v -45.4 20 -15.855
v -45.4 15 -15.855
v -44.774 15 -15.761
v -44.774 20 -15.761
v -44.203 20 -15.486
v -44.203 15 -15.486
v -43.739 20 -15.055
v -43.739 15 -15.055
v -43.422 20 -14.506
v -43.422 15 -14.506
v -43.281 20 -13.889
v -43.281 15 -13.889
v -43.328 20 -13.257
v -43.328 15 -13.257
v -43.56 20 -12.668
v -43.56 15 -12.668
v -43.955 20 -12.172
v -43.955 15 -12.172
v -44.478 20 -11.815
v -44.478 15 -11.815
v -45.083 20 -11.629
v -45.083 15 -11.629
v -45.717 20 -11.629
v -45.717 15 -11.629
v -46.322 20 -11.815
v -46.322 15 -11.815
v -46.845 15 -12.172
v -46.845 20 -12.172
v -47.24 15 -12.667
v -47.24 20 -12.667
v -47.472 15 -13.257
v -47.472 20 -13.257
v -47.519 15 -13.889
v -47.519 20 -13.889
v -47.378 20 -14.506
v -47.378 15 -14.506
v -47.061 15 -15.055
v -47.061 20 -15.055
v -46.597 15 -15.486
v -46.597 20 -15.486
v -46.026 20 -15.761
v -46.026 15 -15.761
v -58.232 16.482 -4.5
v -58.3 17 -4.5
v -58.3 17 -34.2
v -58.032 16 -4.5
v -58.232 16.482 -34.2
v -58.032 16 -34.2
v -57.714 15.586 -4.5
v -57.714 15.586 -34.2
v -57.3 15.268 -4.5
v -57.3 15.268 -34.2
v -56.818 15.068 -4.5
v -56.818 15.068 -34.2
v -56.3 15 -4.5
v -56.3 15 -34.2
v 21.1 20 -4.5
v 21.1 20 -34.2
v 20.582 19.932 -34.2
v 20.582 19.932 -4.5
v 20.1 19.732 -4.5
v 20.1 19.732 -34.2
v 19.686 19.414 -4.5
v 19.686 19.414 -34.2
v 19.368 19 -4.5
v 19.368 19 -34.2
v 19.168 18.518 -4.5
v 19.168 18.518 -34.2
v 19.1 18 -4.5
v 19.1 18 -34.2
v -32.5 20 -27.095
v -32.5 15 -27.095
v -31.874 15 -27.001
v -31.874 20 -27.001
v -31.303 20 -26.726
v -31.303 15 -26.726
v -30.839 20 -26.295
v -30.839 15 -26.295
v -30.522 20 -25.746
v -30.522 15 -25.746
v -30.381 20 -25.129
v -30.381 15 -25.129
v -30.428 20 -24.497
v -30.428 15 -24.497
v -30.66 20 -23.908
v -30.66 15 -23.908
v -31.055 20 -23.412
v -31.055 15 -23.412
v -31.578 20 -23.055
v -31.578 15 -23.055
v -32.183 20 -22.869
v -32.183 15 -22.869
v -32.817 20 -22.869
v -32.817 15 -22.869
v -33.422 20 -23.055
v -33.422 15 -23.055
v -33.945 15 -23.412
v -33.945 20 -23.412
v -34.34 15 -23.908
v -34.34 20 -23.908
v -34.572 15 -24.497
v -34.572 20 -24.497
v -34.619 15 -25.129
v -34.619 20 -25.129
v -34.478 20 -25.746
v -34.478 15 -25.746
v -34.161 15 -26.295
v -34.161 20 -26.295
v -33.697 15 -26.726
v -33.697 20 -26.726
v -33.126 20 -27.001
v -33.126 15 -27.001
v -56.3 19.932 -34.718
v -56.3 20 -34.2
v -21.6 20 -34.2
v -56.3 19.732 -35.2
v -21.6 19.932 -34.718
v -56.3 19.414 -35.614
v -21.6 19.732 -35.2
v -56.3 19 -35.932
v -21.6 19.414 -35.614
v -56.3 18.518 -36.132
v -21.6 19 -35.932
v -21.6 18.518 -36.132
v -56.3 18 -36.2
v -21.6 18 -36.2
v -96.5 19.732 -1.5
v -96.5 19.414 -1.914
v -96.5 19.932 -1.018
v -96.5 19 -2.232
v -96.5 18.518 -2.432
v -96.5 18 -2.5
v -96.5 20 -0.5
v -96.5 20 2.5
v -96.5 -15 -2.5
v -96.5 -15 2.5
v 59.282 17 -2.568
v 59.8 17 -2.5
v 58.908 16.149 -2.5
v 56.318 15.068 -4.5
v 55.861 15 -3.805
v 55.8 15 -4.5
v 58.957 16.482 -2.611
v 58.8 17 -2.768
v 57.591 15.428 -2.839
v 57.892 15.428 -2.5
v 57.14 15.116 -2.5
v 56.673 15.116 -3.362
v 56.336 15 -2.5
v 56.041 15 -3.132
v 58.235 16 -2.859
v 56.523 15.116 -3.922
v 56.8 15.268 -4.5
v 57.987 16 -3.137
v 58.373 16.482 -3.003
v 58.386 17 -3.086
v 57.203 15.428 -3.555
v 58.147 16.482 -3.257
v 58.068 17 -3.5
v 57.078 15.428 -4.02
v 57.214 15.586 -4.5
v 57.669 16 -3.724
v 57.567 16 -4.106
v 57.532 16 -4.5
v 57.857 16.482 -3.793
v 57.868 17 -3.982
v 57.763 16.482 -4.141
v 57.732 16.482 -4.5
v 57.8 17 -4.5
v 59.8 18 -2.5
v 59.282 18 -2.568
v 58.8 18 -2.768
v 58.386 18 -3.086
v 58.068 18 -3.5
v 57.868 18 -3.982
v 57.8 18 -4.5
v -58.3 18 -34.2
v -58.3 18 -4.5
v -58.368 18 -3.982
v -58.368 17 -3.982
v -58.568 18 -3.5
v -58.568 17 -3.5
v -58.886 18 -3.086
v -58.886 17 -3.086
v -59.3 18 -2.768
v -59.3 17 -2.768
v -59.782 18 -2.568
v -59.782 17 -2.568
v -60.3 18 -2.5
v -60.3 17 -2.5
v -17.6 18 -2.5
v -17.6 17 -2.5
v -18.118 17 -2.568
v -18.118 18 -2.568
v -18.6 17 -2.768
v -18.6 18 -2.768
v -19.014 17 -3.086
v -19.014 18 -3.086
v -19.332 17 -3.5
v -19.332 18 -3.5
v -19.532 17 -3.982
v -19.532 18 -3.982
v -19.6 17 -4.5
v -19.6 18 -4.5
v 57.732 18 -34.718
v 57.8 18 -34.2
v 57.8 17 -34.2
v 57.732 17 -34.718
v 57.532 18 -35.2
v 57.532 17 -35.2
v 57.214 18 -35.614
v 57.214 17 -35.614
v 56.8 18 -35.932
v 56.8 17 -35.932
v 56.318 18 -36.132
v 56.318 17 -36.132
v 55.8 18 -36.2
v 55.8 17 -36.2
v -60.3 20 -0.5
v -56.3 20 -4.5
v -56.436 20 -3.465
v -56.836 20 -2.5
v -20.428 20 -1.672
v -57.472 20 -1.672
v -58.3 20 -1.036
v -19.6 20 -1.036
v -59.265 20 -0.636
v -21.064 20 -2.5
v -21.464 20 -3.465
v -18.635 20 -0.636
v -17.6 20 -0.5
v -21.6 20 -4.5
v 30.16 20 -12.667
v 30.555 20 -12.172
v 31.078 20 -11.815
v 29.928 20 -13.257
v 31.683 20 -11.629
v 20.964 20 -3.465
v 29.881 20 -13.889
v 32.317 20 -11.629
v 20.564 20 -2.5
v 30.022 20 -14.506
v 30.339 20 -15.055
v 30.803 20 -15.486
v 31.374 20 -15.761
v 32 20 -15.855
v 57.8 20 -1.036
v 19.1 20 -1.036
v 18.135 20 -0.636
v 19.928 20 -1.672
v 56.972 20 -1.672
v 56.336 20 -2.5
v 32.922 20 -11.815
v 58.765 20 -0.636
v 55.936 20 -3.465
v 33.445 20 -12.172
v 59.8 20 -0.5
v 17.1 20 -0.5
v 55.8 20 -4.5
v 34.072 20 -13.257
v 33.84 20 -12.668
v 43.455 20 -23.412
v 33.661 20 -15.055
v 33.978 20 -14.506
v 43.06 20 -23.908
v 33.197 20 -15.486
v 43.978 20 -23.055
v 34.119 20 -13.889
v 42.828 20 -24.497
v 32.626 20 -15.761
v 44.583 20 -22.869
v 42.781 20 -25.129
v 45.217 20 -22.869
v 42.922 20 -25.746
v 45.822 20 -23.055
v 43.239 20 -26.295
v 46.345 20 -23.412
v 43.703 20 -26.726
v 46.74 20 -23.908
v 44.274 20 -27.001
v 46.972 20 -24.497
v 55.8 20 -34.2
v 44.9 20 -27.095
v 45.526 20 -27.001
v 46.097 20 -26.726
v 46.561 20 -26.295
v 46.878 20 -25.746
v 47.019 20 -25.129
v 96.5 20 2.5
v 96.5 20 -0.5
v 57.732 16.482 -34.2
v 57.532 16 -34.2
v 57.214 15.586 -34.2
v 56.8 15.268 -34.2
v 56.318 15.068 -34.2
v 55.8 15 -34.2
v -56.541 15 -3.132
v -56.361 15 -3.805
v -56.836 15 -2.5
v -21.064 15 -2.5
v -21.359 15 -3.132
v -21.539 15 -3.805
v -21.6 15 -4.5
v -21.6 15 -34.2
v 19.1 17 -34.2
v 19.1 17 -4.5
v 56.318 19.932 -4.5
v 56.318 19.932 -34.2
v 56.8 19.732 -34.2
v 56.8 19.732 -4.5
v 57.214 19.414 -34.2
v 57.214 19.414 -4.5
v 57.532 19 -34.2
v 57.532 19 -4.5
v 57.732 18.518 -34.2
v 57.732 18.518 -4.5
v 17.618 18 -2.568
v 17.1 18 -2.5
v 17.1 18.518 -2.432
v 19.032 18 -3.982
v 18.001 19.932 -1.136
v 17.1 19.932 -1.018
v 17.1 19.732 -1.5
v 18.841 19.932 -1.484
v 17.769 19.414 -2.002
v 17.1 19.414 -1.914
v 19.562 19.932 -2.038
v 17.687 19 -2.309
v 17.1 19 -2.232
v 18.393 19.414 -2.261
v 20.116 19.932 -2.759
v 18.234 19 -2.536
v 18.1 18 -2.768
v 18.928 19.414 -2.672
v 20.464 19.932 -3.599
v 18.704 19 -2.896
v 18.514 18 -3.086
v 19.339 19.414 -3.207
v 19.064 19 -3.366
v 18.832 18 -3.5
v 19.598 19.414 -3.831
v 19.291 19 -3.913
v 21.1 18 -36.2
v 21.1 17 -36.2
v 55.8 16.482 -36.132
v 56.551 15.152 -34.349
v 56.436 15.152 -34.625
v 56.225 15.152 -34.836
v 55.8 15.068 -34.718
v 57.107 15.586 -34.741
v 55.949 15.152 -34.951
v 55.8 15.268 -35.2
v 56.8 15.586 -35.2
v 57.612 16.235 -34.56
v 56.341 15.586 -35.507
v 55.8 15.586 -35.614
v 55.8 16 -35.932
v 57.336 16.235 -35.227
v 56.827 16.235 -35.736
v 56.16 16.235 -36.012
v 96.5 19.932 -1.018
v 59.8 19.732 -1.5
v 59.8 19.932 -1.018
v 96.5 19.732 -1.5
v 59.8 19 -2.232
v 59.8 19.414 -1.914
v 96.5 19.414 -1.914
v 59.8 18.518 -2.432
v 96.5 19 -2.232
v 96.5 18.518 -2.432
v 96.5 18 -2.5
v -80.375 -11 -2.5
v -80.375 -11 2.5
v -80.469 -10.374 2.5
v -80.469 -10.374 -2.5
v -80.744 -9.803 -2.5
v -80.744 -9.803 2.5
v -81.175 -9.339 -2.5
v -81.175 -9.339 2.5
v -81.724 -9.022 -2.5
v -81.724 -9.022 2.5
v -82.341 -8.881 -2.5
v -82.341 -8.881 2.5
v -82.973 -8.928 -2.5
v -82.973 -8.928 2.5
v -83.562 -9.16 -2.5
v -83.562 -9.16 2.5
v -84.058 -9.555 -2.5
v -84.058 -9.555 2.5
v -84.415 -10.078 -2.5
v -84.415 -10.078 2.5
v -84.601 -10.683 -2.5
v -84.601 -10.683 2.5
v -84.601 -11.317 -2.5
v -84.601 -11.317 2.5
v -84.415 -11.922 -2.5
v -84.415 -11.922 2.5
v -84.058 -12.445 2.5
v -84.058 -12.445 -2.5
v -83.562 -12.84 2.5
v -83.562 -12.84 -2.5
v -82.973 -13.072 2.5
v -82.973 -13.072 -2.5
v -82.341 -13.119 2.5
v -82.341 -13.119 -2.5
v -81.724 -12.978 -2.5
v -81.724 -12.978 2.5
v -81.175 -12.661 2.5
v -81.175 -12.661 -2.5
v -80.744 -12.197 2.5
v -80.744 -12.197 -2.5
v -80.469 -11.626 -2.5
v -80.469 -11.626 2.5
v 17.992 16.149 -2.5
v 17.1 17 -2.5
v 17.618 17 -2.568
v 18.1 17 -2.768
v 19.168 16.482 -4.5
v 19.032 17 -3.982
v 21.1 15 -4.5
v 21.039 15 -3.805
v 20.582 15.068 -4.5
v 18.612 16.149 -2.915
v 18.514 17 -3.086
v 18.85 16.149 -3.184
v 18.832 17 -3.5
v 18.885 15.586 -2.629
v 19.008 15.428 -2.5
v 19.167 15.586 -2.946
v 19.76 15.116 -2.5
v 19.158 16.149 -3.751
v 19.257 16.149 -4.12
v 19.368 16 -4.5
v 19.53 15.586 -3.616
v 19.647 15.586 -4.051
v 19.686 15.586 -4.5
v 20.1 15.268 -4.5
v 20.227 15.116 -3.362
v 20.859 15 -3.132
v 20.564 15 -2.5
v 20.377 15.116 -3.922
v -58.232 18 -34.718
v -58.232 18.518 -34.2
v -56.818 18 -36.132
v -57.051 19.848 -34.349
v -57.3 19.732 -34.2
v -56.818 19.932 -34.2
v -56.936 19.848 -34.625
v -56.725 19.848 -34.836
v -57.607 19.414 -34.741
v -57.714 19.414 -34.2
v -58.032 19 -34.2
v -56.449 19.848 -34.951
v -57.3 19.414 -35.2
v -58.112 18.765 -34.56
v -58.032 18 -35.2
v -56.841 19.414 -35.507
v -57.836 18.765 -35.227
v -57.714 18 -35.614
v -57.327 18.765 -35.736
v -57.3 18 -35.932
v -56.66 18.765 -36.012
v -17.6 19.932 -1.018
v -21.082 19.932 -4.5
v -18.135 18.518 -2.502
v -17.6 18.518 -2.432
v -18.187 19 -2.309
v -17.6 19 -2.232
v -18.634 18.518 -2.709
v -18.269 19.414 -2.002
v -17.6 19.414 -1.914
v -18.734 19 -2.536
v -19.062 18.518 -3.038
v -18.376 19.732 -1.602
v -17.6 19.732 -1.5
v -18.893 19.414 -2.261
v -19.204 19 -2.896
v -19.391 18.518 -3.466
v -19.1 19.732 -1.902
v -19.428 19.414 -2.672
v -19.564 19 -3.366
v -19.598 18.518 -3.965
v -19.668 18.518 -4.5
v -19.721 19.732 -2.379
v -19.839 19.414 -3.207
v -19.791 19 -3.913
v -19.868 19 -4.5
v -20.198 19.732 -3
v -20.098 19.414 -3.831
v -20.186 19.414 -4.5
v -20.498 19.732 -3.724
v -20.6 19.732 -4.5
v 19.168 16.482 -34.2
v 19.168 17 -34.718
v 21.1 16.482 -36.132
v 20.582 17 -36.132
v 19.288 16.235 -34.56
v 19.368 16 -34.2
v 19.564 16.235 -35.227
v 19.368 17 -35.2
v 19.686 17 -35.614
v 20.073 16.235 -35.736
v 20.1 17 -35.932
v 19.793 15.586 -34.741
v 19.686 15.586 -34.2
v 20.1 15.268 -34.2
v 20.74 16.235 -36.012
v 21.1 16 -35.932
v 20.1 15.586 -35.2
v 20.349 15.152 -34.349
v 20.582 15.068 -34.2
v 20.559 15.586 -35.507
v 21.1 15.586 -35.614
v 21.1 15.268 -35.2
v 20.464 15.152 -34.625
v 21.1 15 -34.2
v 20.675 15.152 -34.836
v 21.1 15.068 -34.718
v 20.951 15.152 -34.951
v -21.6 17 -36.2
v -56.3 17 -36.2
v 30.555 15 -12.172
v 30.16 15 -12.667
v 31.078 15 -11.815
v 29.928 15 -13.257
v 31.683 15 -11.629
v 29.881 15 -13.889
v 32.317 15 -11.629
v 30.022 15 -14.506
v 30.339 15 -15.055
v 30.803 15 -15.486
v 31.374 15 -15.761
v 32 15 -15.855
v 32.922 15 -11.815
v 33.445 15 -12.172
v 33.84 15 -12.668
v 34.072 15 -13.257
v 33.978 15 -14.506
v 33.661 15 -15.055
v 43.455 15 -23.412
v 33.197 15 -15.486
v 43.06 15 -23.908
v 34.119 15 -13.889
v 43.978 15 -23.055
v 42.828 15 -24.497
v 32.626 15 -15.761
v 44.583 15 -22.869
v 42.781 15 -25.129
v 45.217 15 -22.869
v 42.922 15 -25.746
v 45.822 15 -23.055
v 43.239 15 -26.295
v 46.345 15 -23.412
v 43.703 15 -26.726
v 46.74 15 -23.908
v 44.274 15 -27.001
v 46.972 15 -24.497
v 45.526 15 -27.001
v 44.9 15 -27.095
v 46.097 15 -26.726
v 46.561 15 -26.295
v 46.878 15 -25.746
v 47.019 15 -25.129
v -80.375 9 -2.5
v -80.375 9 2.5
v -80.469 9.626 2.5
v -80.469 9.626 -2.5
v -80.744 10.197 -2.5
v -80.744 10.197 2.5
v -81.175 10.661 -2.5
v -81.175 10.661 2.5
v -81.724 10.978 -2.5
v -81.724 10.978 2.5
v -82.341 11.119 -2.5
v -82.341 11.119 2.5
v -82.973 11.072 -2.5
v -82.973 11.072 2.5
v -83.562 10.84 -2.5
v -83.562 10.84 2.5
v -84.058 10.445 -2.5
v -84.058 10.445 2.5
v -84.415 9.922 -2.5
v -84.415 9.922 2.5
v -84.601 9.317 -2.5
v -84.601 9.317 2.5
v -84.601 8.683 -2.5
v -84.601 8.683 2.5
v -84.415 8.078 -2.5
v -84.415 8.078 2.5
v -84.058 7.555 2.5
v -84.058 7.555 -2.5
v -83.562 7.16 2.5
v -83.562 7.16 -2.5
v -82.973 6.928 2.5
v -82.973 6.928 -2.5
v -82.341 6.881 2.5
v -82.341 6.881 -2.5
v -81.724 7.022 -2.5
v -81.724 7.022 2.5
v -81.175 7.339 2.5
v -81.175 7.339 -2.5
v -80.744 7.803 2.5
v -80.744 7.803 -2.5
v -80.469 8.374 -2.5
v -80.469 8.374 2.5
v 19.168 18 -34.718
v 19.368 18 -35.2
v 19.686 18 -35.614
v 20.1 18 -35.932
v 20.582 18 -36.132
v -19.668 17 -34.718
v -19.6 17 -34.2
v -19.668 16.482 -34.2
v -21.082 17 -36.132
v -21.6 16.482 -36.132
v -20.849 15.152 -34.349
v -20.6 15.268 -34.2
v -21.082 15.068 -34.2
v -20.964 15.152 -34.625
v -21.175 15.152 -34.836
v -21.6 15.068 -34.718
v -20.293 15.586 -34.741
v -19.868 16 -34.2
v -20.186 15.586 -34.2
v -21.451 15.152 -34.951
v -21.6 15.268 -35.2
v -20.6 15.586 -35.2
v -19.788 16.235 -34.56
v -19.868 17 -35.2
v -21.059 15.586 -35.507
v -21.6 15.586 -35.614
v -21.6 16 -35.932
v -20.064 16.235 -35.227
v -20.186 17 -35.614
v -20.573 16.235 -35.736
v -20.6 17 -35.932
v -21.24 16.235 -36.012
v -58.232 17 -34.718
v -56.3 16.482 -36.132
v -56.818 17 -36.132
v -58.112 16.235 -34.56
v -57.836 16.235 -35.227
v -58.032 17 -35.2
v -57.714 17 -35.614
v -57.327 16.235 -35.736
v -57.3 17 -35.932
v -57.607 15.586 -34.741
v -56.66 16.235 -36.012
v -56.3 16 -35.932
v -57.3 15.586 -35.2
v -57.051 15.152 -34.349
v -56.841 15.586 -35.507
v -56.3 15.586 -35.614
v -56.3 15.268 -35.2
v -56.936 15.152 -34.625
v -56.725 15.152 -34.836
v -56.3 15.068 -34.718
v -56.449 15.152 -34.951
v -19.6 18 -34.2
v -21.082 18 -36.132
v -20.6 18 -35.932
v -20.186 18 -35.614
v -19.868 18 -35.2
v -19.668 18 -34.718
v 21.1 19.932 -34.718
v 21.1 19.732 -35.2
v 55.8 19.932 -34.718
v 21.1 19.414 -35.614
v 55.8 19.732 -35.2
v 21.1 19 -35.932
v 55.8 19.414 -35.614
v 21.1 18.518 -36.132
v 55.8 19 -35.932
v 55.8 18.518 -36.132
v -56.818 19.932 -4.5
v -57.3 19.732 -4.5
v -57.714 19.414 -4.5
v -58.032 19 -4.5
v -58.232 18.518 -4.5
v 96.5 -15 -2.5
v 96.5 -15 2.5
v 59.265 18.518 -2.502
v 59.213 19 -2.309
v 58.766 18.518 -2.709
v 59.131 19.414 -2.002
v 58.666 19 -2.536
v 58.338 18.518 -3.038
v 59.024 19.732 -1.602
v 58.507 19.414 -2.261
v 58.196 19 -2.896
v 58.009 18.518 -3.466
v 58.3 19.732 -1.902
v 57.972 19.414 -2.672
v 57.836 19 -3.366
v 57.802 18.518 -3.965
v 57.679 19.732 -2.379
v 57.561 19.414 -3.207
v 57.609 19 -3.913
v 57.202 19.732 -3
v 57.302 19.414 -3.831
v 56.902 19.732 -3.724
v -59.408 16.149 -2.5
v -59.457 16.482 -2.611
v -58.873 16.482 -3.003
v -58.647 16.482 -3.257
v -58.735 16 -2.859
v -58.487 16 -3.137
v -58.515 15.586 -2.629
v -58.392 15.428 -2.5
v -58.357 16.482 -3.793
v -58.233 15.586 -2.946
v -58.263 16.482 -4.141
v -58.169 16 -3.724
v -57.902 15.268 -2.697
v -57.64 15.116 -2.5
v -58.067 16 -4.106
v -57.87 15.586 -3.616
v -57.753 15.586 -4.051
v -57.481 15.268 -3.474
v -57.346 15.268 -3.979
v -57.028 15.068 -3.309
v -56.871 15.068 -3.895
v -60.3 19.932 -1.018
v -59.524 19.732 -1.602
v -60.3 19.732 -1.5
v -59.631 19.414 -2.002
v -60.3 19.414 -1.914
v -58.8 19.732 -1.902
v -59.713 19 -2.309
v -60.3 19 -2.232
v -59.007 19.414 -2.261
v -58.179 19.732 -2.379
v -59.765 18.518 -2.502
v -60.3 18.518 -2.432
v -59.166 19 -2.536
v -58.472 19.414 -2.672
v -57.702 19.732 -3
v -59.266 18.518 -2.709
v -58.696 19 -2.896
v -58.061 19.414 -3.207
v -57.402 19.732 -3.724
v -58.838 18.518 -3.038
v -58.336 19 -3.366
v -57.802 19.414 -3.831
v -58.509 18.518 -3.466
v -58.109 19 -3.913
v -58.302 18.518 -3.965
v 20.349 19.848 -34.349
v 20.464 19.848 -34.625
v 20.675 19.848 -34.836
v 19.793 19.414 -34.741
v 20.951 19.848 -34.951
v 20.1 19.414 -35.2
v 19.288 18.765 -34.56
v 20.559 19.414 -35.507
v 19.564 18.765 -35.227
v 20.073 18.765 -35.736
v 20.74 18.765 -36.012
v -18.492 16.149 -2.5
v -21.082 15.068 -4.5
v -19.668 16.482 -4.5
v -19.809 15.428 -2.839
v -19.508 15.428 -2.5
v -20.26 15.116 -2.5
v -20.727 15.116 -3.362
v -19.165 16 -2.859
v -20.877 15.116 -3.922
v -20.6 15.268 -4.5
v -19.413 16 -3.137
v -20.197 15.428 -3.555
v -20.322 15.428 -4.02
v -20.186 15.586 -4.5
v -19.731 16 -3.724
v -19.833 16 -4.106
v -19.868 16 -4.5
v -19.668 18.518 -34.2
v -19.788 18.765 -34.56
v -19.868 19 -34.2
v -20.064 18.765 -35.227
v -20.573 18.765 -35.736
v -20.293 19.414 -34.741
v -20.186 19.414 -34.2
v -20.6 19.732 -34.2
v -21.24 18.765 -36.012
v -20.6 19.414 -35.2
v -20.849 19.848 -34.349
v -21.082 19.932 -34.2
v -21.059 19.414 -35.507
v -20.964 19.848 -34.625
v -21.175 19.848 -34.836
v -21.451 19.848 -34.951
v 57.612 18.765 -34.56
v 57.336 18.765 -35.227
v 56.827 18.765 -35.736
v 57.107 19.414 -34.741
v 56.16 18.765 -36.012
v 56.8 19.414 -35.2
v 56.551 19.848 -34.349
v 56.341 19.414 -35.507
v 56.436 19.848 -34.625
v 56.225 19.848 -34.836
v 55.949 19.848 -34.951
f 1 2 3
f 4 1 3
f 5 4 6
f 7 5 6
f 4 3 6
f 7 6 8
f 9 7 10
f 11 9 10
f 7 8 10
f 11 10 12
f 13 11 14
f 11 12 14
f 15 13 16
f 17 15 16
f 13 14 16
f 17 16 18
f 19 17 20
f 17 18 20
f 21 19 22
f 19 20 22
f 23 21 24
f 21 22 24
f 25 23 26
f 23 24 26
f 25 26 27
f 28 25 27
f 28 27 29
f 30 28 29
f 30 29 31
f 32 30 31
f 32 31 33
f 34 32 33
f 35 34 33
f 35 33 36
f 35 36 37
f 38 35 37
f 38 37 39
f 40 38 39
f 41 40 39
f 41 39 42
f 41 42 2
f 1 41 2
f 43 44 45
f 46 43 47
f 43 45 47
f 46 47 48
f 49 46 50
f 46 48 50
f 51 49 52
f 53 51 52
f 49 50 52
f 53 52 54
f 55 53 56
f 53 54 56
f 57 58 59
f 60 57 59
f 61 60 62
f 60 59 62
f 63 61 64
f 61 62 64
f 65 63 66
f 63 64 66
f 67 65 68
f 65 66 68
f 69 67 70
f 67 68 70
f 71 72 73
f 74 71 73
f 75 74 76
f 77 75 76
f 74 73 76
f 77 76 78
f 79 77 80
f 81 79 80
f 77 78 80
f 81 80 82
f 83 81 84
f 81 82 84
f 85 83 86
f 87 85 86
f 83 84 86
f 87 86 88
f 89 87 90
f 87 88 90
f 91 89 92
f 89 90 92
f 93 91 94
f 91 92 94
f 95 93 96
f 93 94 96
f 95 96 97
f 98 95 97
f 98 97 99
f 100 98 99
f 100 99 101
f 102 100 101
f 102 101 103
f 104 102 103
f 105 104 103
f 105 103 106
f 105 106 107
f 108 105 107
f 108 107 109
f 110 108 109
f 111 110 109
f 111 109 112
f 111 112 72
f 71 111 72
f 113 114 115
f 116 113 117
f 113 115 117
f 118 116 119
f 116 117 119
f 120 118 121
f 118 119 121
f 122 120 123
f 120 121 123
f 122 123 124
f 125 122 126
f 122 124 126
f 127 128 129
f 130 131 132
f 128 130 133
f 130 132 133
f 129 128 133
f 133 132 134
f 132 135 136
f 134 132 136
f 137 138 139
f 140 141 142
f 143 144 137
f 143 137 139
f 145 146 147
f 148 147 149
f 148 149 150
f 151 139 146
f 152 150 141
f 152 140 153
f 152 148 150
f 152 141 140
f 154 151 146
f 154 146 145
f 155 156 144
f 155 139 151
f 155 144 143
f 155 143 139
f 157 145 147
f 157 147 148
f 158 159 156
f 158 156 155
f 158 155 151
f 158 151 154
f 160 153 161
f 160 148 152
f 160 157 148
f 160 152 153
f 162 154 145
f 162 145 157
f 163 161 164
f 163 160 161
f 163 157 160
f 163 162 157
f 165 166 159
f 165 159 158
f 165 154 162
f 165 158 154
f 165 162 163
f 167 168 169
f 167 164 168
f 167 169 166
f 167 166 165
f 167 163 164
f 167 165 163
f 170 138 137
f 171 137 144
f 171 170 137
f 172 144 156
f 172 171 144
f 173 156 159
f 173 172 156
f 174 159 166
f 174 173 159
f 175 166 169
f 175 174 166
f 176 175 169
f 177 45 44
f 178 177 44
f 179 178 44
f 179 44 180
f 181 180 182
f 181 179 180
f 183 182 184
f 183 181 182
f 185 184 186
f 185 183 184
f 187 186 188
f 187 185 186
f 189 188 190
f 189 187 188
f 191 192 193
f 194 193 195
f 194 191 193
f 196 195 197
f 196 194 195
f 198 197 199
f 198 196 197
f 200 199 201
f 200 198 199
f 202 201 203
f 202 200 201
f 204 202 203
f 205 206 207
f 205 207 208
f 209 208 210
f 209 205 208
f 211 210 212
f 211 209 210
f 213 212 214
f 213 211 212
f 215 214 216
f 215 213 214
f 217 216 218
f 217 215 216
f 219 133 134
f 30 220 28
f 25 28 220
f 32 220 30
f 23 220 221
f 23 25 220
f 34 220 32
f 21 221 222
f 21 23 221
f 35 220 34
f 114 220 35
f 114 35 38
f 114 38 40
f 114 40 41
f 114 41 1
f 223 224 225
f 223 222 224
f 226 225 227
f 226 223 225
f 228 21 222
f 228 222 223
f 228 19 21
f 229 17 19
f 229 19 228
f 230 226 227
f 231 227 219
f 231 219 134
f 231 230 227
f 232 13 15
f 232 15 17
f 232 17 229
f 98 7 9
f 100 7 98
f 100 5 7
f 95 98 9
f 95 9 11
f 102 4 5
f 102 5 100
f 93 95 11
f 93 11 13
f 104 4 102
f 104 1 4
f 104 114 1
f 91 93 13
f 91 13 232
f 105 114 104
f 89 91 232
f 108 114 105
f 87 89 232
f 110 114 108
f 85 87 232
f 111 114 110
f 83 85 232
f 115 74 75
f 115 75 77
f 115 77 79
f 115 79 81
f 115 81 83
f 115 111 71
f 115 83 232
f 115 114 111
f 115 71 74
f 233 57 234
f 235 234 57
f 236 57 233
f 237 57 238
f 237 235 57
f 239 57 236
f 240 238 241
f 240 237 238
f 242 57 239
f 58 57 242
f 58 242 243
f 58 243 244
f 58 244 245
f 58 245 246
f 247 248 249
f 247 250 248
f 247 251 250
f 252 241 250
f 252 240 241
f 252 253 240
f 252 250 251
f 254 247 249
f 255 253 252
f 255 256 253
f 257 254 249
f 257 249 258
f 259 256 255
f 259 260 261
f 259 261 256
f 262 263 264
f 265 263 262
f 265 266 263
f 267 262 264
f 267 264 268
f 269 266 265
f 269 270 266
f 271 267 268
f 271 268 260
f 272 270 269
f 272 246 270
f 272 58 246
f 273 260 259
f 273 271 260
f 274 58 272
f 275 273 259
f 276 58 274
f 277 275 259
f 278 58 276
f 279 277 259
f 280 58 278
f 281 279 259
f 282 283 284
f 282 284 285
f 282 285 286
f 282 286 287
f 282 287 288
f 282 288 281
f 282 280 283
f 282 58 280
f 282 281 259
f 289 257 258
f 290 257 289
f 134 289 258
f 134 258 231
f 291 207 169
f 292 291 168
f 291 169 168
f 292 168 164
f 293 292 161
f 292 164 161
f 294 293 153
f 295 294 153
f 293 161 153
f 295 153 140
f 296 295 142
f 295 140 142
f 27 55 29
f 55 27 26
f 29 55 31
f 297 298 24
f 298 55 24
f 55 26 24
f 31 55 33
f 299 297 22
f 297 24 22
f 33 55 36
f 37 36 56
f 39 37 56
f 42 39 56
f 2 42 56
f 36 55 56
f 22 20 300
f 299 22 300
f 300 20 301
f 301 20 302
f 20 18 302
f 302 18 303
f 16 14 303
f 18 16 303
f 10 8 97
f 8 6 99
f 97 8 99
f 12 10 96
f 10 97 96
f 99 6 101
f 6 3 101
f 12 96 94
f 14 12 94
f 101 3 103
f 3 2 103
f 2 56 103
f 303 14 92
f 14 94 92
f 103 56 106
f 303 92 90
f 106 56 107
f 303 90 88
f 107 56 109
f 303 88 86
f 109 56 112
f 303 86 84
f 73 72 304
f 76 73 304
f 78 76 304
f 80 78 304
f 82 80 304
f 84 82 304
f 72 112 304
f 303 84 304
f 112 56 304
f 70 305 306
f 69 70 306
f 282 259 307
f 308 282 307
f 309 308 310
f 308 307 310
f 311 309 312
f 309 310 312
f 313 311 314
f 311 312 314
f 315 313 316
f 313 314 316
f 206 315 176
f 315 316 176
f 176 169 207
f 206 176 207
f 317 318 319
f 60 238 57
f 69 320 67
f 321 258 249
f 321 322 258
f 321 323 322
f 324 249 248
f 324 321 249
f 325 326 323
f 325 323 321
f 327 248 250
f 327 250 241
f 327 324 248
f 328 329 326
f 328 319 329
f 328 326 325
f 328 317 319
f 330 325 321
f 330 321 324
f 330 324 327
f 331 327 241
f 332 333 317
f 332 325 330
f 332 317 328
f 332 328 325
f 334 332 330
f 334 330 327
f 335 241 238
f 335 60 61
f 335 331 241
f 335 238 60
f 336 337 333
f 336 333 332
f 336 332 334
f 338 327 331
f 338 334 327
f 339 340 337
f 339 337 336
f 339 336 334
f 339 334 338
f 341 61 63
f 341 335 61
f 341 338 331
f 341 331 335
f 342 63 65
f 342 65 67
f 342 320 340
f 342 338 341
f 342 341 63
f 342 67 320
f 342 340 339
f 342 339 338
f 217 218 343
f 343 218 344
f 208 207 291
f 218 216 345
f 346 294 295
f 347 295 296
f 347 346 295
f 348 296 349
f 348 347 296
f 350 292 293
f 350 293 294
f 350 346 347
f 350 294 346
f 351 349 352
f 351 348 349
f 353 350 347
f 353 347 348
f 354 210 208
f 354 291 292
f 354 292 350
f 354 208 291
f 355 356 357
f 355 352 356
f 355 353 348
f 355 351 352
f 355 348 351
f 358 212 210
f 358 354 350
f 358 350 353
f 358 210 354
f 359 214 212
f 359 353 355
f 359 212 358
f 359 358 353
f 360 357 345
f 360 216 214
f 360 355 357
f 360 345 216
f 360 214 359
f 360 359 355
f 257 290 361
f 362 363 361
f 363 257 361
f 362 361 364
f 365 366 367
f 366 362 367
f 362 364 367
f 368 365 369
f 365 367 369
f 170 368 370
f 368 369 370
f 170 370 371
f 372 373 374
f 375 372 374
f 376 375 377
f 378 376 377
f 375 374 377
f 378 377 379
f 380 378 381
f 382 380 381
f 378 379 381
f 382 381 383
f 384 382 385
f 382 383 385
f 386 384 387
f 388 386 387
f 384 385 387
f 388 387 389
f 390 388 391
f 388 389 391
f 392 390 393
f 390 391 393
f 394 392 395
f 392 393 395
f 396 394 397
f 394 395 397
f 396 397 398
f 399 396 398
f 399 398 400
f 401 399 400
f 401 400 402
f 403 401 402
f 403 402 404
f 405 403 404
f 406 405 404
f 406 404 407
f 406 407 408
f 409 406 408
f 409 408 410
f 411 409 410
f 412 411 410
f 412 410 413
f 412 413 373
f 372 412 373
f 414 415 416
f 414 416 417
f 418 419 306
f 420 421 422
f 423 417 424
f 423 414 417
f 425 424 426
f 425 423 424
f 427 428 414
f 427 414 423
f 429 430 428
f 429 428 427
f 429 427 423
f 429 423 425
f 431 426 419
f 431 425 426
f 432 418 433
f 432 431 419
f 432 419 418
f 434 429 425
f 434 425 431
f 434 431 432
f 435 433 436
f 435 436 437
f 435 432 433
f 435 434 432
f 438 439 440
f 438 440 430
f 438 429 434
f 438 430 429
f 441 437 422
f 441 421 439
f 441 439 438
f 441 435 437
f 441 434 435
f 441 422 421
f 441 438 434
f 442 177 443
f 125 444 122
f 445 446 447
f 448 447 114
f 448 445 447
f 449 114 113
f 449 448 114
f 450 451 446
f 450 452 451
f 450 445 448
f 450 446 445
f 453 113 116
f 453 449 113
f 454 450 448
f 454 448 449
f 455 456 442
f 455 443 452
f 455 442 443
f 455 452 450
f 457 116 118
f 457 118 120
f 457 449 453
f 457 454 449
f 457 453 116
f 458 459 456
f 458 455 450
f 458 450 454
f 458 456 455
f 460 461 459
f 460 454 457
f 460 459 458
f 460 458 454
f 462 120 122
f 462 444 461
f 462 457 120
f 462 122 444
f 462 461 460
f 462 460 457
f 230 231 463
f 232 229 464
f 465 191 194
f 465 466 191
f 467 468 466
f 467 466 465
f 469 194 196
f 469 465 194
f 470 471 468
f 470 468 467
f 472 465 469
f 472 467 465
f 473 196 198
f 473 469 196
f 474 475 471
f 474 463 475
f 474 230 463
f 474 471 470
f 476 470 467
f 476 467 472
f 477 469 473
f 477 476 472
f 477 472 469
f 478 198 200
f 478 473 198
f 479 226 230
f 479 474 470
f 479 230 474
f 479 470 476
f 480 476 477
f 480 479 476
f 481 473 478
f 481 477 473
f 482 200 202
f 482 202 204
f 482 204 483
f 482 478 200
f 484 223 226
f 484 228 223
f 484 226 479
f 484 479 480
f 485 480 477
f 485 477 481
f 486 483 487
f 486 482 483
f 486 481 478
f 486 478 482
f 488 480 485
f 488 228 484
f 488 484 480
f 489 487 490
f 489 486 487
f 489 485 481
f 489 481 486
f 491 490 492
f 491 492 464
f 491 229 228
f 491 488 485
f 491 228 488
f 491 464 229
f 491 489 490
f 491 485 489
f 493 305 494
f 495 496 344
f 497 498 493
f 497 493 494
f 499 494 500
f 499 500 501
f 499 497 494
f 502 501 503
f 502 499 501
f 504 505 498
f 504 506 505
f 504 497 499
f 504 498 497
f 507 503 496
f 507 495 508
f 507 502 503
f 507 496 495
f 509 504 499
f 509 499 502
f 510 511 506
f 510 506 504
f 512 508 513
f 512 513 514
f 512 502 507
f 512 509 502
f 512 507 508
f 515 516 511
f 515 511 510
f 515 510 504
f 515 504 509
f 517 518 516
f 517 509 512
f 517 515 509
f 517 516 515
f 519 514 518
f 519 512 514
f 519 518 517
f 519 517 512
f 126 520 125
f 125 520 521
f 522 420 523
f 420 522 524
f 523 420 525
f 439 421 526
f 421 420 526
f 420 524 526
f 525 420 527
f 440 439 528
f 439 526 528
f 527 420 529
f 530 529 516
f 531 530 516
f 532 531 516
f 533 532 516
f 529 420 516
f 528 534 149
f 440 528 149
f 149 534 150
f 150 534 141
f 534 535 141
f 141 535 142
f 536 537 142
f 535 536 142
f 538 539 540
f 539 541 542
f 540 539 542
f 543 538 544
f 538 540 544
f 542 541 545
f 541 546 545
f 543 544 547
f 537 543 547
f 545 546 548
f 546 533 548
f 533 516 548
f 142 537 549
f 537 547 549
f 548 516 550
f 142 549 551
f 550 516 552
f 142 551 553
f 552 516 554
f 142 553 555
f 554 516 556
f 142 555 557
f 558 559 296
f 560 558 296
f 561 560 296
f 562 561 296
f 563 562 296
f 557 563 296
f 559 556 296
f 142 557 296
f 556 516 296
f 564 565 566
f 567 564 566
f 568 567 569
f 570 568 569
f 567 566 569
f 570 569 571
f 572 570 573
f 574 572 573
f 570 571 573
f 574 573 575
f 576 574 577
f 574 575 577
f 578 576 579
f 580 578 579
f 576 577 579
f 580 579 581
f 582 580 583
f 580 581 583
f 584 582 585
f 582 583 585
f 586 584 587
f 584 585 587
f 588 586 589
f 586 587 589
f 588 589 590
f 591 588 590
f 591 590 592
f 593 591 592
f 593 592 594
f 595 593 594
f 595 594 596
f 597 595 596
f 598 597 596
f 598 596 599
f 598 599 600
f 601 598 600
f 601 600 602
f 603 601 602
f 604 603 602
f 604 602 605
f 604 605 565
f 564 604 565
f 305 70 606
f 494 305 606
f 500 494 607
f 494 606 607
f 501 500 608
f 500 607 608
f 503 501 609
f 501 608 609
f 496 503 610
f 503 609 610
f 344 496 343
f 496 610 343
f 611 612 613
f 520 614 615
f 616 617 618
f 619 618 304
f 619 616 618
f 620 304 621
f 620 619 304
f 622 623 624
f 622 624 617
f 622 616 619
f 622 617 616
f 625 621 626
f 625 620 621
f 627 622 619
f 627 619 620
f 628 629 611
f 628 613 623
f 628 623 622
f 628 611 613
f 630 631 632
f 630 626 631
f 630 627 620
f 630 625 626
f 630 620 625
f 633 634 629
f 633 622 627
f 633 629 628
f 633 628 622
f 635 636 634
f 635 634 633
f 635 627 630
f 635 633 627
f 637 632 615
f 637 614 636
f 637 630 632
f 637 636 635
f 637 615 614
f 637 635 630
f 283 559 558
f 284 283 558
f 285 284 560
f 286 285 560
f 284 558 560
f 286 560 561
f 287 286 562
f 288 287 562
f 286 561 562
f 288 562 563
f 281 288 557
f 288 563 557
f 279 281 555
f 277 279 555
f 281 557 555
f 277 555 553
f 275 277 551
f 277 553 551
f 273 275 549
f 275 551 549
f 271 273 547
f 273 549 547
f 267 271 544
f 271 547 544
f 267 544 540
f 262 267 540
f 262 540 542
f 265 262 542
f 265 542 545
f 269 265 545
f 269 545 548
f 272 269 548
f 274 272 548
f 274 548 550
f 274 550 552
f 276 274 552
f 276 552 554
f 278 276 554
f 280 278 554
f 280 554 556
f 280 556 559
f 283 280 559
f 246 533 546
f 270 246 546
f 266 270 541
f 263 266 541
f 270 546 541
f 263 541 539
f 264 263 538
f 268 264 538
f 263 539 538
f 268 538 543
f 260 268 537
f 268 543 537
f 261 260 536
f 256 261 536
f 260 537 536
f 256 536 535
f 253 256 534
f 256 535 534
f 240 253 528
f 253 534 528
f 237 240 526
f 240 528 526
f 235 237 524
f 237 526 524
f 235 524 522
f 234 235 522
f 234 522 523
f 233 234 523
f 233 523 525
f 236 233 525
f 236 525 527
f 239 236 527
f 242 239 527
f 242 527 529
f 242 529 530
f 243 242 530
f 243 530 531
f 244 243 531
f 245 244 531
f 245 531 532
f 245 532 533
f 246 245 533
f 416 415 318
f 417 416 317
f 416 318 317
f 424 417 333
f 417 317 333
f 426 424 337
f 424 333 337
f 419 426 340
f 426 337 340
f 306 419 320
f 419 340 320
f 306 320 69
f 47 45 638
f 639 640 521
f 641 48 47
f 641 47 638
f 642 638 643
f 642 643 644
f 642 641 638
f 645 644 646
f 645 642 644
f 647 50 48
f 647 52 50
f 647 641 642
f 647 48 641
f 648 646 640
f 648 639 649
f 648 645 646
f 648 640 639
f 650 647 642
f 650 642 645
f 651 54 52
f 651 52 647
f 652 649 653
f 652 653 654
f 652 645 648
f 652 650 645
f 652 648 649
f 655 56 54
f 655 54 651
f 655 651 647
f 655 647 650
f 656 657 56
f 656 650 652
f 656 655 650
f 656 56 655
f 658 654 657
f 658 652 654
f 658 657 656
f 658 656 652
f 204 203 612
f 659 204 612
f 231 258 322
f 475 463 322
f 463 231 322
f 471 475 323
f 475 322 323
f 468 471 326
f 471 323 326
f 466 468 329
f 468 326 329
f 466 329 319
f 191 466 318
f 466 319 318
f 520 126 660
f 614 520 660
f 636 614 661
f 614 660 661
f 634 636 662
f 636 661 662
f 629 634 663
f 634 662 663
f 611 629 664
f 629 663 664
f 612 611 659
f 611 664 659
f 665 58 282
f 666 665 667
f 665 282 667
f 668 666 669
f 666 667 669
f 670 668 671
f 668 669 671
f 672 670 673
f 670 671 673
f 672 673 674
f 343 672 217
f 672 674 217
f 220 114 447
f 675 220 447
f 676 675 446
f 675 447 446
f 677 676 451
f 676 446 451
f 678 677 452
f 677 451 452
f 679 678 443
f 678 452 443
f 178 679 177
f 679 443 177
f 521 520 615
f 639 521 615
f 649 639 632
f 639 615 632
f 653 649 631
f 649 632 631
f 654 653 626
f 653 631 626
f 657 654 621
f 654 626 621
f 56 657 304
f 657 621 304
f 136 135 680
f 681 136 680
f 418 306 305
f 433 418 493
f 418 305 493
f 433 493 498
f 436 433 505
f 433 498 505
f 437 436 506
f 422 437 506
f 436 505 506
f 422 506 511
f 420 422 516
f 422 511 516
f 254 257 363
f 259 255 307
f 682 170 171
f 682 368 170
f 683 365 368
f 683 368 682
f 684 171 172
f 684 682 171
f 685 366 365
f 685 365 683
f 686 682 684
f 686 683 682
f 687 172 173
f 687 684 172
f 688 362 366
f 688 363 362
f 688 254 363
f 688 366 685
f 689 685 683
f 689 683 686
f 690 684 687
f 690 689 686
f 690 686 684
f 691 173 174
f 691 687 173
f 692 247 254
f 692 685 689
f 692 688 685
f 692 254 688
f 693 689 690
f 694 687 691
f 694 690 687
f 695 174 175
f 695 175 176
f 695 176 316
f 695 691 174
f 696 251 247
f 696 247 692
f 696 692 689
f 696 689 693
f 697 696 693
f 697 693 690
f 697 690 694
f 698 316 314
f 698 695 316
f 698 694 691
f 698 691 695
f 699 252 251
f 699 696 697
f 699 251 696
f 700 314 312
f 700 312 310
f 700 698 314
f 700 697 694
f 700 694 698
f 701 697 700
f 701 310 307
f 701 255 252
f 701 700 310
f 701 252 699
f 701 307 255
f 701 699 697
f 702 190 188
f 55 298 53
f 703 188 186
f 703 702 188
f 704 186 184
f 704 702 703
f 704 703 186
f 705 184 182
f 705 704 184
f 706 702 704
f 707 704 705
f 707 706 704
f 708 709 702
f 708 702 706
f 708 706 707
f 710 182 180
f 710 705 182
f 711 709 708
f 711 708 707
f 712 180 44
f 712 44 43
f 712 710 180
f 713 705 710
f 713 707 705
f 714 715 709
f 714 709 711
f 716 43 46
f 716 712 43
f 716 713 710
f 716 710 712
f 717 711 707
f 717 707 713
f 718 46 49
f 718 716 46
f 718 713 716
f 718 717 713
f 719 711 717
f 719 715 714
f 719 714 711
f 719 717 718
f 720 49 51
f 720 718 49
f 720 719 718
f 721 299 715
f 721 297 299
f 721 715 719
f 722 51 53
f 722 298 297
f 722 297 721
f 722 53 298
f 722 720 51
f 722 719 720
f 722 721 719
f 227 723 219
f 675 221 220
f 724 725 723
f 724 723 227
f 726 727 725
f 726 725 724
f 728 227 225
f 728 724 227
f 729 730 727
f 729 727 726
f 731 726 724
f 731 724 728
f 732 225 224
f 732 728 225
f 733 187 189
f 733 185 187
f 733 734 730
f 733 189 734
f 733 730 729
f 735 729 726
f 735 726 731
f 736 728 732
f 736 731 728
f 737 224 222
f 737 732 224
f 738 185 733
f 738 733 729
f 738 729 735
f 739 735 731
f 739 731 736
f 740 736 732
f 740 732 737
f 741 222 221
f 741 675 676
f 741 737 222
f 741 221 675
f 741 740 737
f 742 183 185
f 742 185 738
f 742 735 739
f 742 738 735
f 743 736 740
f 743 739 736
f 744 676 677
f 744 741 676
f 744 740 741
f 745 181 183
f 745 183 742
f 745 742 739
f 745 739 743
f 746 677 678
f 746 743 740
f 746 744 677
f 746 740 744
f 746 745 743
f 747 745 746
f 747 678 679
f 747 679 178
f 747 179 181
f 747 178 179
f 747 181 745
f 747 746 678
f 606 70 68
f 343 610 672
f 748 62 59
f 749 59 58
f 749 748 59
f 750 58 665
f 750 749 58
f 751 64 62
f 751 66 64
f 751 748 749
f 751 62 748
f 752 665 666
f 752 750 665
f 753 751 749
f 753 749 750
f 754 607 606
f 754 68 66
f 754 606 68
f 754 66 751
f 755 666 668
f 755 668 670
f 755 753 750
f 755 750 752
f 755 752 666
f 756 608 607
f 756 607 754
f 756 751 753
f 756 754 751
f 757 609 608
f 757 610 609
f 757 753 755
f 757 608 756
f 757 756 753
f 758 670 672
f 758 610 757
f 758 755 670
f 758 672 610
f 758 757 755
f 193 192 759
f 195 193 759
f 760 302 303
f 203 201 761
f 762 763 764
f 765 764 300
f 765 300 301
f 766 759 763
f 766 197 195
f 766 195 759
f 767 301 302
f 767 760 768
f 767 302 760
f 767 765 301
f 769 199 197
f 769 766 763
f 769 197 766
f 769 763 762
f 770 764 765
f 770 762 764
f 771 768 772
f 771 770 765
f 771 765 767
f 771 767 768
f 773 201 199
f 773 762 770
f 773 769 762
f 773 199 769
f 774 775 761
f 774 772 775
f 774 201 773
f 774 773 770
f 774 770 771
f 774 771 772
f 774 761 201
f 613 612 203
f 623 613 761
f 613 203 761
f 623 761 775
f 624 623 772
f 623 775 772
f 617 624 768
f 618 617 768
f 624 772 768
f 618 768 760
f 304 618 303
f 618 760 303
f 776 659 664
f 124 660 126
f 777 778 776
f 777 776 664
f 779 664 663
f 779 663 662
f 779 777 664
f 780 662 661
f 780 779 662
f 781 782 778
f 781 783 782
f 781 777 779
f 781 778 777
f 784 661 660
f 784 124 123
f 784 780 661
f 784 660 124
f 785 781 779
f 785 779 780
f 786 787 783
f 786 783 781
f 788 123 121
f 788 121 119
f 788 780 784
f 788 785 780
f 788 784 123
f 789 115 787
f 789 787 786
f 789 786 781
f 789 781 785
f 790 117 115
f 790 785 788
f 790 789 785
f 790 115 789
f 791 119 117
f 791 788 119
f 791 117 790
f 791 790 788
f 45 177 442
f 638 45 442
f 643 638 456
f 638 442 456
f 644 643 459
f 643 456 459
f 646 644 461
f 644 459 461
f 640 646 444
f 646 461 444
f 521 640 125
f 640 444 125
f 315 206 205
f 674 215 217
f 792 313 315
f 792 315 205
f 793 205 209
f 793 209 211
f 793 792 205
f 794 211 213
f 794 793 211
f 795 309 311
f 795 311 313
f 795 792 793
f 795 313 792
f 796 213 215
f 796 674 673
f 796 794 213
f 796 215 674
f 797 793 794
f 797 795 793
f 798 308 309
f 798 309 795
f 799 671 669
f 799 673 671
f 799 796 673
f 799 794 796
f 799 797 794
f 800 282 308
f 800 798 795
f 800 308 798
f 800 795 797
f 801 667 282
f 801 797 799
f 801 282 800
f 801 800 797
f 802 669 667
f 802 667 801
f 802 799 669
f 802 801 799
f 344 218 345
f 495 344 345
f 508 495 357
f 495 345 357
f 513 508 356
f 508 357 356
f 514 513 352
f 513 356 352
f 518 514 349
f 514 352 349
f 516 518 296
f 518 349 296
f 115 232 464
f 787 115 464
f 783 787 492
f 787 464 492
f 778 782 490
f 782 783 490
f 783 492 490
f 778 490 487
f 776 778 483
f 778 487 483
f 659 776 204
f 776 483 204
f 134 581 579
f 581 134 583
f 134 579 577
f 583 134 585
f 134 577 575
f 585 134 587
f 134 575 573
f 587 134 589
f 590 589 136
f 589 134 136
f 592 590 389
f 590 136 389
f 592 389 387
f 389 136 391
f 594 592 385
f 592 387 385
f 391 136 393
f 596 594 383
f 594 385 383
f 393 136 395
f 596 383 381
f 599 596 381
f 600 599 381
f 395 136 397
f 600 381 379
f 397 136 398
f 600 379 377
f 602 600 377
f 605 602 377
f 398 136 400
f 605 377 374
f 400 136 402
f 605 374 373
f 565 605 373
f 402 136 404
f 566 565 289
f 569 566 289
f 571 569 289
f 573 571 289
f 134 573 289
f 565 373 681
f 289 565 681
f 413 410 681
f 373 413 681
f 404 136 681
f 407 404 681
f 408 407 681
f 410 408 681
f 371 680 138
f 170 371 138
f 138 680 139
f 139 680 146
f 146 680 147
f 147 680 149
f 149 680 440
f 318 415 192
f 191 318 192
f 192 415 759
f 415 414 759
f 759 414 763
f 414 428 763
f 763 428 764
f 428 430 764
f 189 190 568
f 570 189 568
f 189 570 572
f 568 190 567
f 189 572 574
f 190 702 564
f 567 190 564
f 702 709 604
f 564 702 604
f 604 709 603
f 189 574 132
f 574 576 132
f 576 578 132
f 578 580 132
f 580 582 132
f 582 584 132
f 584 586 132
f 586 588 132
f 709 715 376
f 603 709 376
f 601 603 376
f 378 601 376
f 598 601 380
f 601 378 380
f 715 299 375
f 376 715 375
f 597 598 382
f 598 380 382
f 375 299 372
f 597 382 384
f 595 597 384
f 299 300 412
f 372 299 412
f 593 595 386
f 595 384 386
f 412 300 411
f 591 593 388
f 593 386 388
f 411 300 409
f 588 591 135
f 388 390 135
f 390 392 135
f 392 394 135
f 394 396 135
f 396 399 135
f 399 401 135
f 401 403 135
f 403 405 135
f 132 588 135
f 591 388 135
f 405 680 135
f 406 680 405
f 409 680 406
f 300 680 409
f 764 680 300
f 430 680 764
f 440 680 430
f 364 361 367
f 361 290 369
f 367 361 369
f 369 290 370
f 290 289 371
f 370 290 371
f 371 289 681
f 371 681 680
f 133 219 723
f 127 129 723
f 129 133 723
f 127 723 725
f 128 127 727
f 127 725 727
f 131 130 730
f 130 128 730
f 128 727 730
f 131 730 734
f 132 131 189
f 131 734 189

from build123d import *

# Parameters (mm, degrees)
SKETCH1_W           = 193
SKETCH1_H           = 5
BOSS_EXTRUDE1_DEPTH = 15
BOSS_EXTRUDE2_DEPTH = 5
CUT_EXTRUDE1_REACH  = 109.344
SKETCH3_R           = 2.125
FILLET3_R           = 2
FILLET4_R           = 2
SKETCH4_R           = 2.125
CUT_EXTRUDE2_DEPTH  = 106.877004204


with BuildPart() as part:
    # Sketch1 → Boss-Extrude1 (new, symmetric)
    with BuildSketch(Plane(origin=(0, 0, 0), x_dir=(1, 0, 0), z_dir=(0, 1, 0))):
        Rectangle(SKETCH1_W, SKETCH1_H)
    extrude(amount=BOSS_EXTRUDE1_DEPTH, both=True)

    # Sketch2 → Boss-Extrude2 (add)
    with BuildSketch(Plane(origin=(0, 15, 0), x_dir=(1, 0, 0), z_dir=(0, 1, 0))):
        Polygon((-58.3, 36.2), (-58.3, 2.5), (-96.5, 2.5), (-96.5, -2.5), (96.5, -2.5), (96.5, 2.5), (57.8, 2.5), (57.8, 36.2), (19.1, 36.2), (19.1, 2.5), (-19.6, 2.5), (-19.6, 36.2), align=None)
    extrude(amount=BOSS_EXTRUDE2_DEPTH)

    # Sketch3 → Cut-Extrude1 (cut, up to next)
    with BuildSketch(Plane.XZ.offset(-15), mode=Mode.PRIVATE) as cut_extrude1_sk1:
        with Locations(Location((-45.4, -13.73, 0), (0, 0, 270))):
            Circle(SKETCH3_R)
    cut_extrude1_tool1 = extrude(cut_extrude1_sk1.sketch, amount=-CUT_EXTRUDE1_REACH, mode=Mode.PRIVATE) & part.part
    # Sketch3 → Cut-Extrude1 (cut, up to next)
    with BuildSketch(Plane.XZ.offset(-15), mode=Mode.PRIVATE) as cut_extrude1_sk2:
        with Locations(Location((-32.5, -24.97, 0), (0, 0, 270))):
            Circle(SKETCH3_R)
    cut_extrude1_tool2 = extrude(cut_extrude1_sk2.sketch, amount=-CUT_EXTRUDE1_REACH, mode=Mode.PRIVATE) & part.part
    # Sketch3 → Cut-Extrude1 (cut, up to next)
    with BuildSketch(Plane.XZ.offset(-15), mode=Mode.PRIVATE) as cut_extrude1_sk3:
        with Locations(Location((32, -13.73, 0), (0, 0, 270))):
            Circle(SKETCH3_R)
    cut_extrude1_tool3 = extrude(cut_extrude1_sk3.sketch, amount=-CUT_EXTRUDE1_REACH, mode=Mode.PRIVATE) & part.part
    # Sketch3 → Cut-Extrude1 (cut, up to next)
    with BuildSketch(Plane.XZ.offset(-15), mode=Mode.PRIVATE) as cut_extrude1_sk4:
        with Locations(Location((44.9, -24.97, 0), (0, 0, 270))):
            Circle(SKETCH3_R)
    cut_extrude1_tool4 = extrude(cut_extrude1_sk4.sketch, amount=-CUT_EXTRUDE1_REACH, mode=Mode.PRIVATE) & part.part
    add(cut_extrude1_tool1.solids().sort_by_distance((-45.4, 15, -13.73))[0], mode=Mode.SUBTRACT)
    add(cut_extrude1_tool2.solids().sort_by_distance((-32.5, 15, -24.97))[0], mode=Mode.SUBTRACT)
    add(cut_extrude1_tool3.solids().sort_by_distance((32, 15, -13.73))[0], mode=Mode.SUBTRACT)
    add(cut_extrude1_tool4.solids().sort_by_distance((44.9, 15, -24.97))[0], mode=Mode.SUBTRACT)

    # Fillet3
    fillet3_edges = [part.edges().sort_by_distance(p)[0] for p in [
        (-58.3, 17.5, -36.2),
        (-58.3, 17.5, -2.5),
        (57.8, 17.5, -2.5),
        (57.8, 17.5, -36.2),
        (19.1, 17.5, -36.2),
        (19.1, 17.5, -2.5),
        (-19.6, 17.5, -2.5),
        (-19.6, 17.5, -36.2),
    ]]
    fillet(fillet3_edges, radius=FILLET3_R)

    # Fillet4
    # the kernel refuses this fillet: 2 mm, written as the material it takes off along each edge
    with BuildSketch(Plane(origin=(21.1, 20, -34.2), x_dir=(-1, 0, 0), z_dir=(0, 0, 1))) as fillet4_piece_1:
        with BuildLine():
            CenterArc((2 - FILLET4_R, FILLET4_R), FILLET4_R, 270, 90)
            Line((2 - FILLET4_R, 0), (2, 0))
            Line((2, 0), (2, FILLET4_R))
        make_face()
    revolve(axis=Axis((21.1, 20, -34.2), (0, -1, 0)), revolution_arc=90, mode=Mode.SUBTRACT)
    with BuildSketch(Plane(origin=(-21.6, 20, -34.2), x_dir=(1, 0, 0), z_dir=(0, 0, 1))) as fillet4_piece_2:
        with BuildLine():
            CenterArc((2 - FILLET4_R, -FILLET4_R), FILLET4_R, 0, 90)
            Line((2 - FILLET4_R, 0), (2, 0))
            Line((2, 0), (2, -FILLET4_R))
        make_face()
    revolve(axis=Axis((-21.6, 20, -34.2), (0, 1, 0)), revolution_arc=90, mode=Mode.SUBTRACT)
    with BuildSketch(Plane(origin=(-56.3, 20, -34.2), x_dir=(-1, 0, 0), z_dir=(0, 0, 1))) as fillet4_piece_3:
        with BuildLine():
            CenterArc((2 - FILLET4_R, FILLET4_R), FILLET4_R, 270, 90)
            Line((2 - FILLET4_R, 0), (2, 0))
            Line((2, 0), (2, FILLET4_R))
        make_face()
    revolve(axis=Axis((-56.3, 20, -34.2), (0, -1, 0)), revolution_arc=90, mode=Mode.SUBTRACT)
    with BuildSketch(Plane(origin=(19.1, 15, -34.2), x_dir=(0, 1, 0), z_dir=(0, 0, 1)), Plane(origin=(57.8, 15, -4.5), x_dir=(0, 1, 0), z_dir=(0, 0, -1)), Plane(origin=(-19.6, 15, -4.5), x_dir=(0, 1, 0), z_dir=(0, 0, -1)), Plane(origin=(-58.3, 15, -34.2), x_dir=(0, 1, 0), z_dir=(0, 0, 1))) as fillet4_piece_4:
        with BuildLine():
            CenterArc((FILLET4_R, -FILLET4_R), FILLET4_R, 90, 90)
            Line((0, -FILLET4_R), (0, 0))
            Line((0, 0), (FILLET4_R, 0))
        make_face()
    extrude(amount=29.7, mode=Mode.SUBTRACT)
    with BuildSketch(Plane(origin=(55.8, 15, -36.2), x_dir=(0, 1, 0), z_dir=(-1, 0, 0)), Plane(origin=(-21.6, 15, -36.2), x_dir=(0, 1, 0), z_dir=(-1, 0, 0))) as fillet4_piece_5:
        with BuildLine():
            CenterArc((FILLET4_R, -FILLET4_R), FILLET4_R, 90, 90)
            Line((0, -FILLET4_R), (0, 0))
            Line((0, 0), (FILLET4_R, 0))
        make_face()
    extrude(amount=34.7, mode=Mode.SUBTRACT)
    with BuildSketch(Plane(origin=(55.8, 15, -34.2), x_dir=(1, 0, 0), z_dir=(0, 0, 1))) as fillet4_piece_6:
        with BuildLine():
            CenterArc((2 - FILLET4_R, FILLET4_R), FILLET4_R, 270, 90)
            Line((2 - FILLET4_R, 0), (2, 0))
            Line((2, 0), (2, FILLET4_R))
        make_face()
    revolve(axis=Axis((55.8, 15, -34.2), (0, 1, 0)), revolution_arc=90, mode=Mode.SUBTRACT)
    with BuildSketch(Plane(origin=(21.1, 15, -34.2), x_dir=(-1, 0, 0), z_dir=(0, 0, 1))) as fillet4_piece_7:
        with BuildLine():
            CenterArc((2 - FILLET4_R, -FILLET4_R), FILLET4_R, 0, 90)
            Line((2 - FILLET4_R, 0), (2, 0))
            Line((2, 0), (2, -FILLET4_R))
        make_face()
    revolve(axis=Axis((21.1, 15, -34.2), (0, -1, 0)), revolution_arc=90, mode=Mode.SUBTRACT)
    with BuildSketch(Plane(origin=(-17.6, 15, -4.5), x_dir=(0.5976672776328267, 0, -0.8017442392976488), z_dir=(-0.8017442392976488, 0, -0.5976672776328267))) as fillet4_piece_8_section:
        with BuildLine():
            CenterArc((2 + FILLET4_R, -FILLET4_R), FILLET4_R, 90, 90)
            Line((2, -FILLET4_R), (2, 0))
            Line((2, 0), (2 + FILLET4_R, 0))
        make_face()
    fillet4_piece_8 = revolve(axis=Axis((-17.6, 15, -4.5), (0, -1, 0)), revolution_arc=233.296989237, mode=Mode.PRIVATE)
    fillet4_piece_8 = split(fillet4_piece_8, bisect_by=Plane(origin=(-19.099877837, 15.623256941, -2.5), z_dir=(0, 0, -1)), keep=Keep.TOP, mode=Mode.PRIVATE)
    add(fillet4_piece_8, mode=Mode.SUBTRACT)
    with BuildSketch(Plane(origin=(-17.6, 20, -4.5), x_dir=(0, 0, 1), z_dir=(1, 0, 0))) as fillet4_piece_9:
        with BuildLine():
            CenterArc((2 + FILLET4_R, FILLET4_R), FILLET4_R, 180, 90)
            Line((2 + FILLET4_R, 0), (2, 0))
            Line((2, 0), (2, FILLET4_R))
        make_face()
    revolve(axis=Axis((-17.6, 20, -4.5), (0, -1, 0)), revolution_arc=90, mode=Mode.SUBTRACT)
    with BuildSketch(Plane(origin=(-60.3, 15, -4.5), x_dir=(-0.5976672776328267, 0, -0.8017442392976488), z_dir=(0.8017442392976488, 0, -0.5976672776328267))) as fillet4_piece_10_section:
        with BuildLine():
            CenterArc((2 + FILLET4_R, FILLET4_R), FILLET4_R, 180, 90)
            Line((2 + FILLET4_R, 0), (2, 0))
            Line((2, 0), (2, FILLET4_R))
        make_face()
    fillet4_piece_10 = revolve(axis=Axis((-60.3, 15, -4.5), (0, 1, 0)), revolution_arc=233.296989237, mode=Mode.PRIVATE)
    fillet4_piece_10 = split(fillet4_piece_10, bisect_by=Plane(origin=(-58.800122111, 15.623256622, -2.5), z_dir=(0, 0, -1)), keep=Keep.TOP, mode=Mode.PRIVATE)
    add(fillet4_piece_10, mode=Mode.SUBTRACT)
    with BuildSketch(Plane(origin=(-60.3, 20, -4.5), x_dir=(0, 0, 1), z_dir=(-1, 0, 0))) as fillet4_piece_11:
        with BuildLine():
            CenterArc((2 + FILLET4_R, -FILLET4_R), FILLET4_R, 90, 90)
            Line((2 + FILLET4_R, 0), (2, 0))
            Line((2, 0), (2, -FILLET4_R))
        make_face()
    revolve(axis=Axis((-60.3, 20, -4.5), (0, 1, 0)), revolution_arc=90, mode=Mode.SUBTRACT)
    with BuildSketch(Plane(origin=(17.1, 15, -4.5), x_dir=(-0.5976672776328281, 0, -0.8017442392976479), z_dir=(0.8017442392976479, 0, -0.5976672776328281))) as fillet4_piece_12_section:
        with BuildLine():
            CenterArc((2 + FILLET4_R, FILLET4_R), FILLET4_R, 180, 90)
            Line((2 + FILLET4_R, 0), (2, 0))
            Line((2, 0), (2, FILLET4_R))
        make_face()
    fillet4_piece_12 = revolve(axis=Axis((17.1, 15, -4.5), (0, 1, 0)), revolution_arc=233.296989237, mode=Mode.PRIVATE)
    fillet4_piece_12 = split(fillet4_piece_12, bisect_by=Plane(origin=(18.599877909, 15.623256541, -2.5), z_dir=(0, 0, -1)), keep=Keep.TOP, mode=Mode.PRIVATE)
    add(fillet4_piece_12, mode=Mode.SUBTRACT)
    with BuildSketch(Plane(origin=(17.1, 20, -4.5), x_dir=(0, 0, 1), z_dir=(-1, 0, 0))) as fillet4_piece_13:
        with BuildLine():
            CenterArc((2 + FILLET4_R, -FILLET4_R), FILLET4_R, 90, 90)
            Line((2 + FILLET4_R, 0), (2, 0))
            Line((2, 0), (2, -FILLET4_R))
        make_face()
    revolve(axis=Axis((17.1, 20, -4.5), (0, 1, 0)), revolution_arc=90, mode=Mode.SUBTRACT)
    with BuildSketch(Plane(origin=(59.8, 15, -4.5), x_dir=(0.5976672776328267, 0, -0.8017442392976488), z_dir=(-0.8017442392976488, 0, -0.5976672776328267))) as fillet4_piece_14_section:
        with BuildLine():
            CenterArc((2 + FILLET4_R, -FILLET4_R), FILLET4_R, 90, 90)
            Line((2, -FILLET4_R), (2, 0))
            Line((2, 0), (2 + FILLET4_R, 0))
        make_face()
    fillet4_piece_14 = revolve(axis=Axis((59.8, 15, -4.5), (0, -1, 0)), revolution_arc=233.296989237, mode=Mode.PRIVATE)
    fillet4_piece_14 = split(fillet4_piece_14, bisect_by=Plane(origin=(58.300122152, 15.623256947, -2.5), z_dir=(0, 0, -1)), keep=Keep.TOP, mode=Mode.PRIVATE)
    add(fillet4_piece_14, mode=Mode.SUBTRACT)
    with BuildSketch(Plane(origin=(59.8, 20, -4.5), x_dir=(0, 0, 1), z_dir=(1, 0, 0))) as fillet4_piece_15:
        with BuildLine():
            CenterArc((2 + FILLET4_R, FILLET4_R), FILLET4_R, 180, 90)
            Line((2 + FILLET4_R, 0), (2, 0))
            Line((2, 0), (2, FILLET4_R))
        make_face()
    revolve(axis=Axis((59.8, 20, -4.5), (0, -1, 0)), revolution_arc=90, mode=Mode.SUBTRACT)
    with BuildSketch(Plane(origin=(101.5, 20, -2.5), x_dir=(0, -1, 0), z_dir=(-1, 0, 0))) as fillet4_piece_16:
        with BuildLine():
            CenterArc((FILLET4_R, FILLET4_R), FILLET4_R, 180, 90)
            Line((0, FILLET4_R), (0, 0))
            Line((0, 0), (FILLET4_R, 0))
        make_face()
    extrude(amount=41.7, mode=Mode.SUBTRACT)
    with BuildSketch(Plane(origin=(-19.6, 20, -4.5), x_dir=(0, -1, 0), z_dir=(0, 0, -1)), Plane(origin=(-58.3, 20, -34.2), x_dir=(0, -1, 0), z_dir=(0, 0, 1)), Plane(origin=(57.8, 20, -4.5), x_dir=(0, -1, 0), z_dir=(0, 0, -1)), Plane(origin=(19.1, 20, -34.2), x_dir=(0, -1, 0), z_dir=(0, 0, 1))) as fillet4_piece_17:
        with BuildLine():
            CenterArc((FILLET4_R, FILLET4_R), FILLET4_R, 180, 90)
            Line((0, FILLET4_R), (0, 0))
            Line((0, 0), (FILLET4_R, 0))
        make_face()
    extrude(amount=29.7, mode=Mode.SUBTRACT)
    with BuildSketch(Plane(origin=(-60.3, 20, -2.5), x_dir=(0, -1, 0), z_dir=(-1, 0, 0))) as fillet4_piece_18:
        with BuildLine():
            CenterArc((FILLET4_R, FILLET4_R), FILLET4_R, 180, 90)
            Line((0, FILLET4_R), (0, 0))
            Line((0, 0), (FILLET4_R, 0))
        make_face()
    extrude(amount=41.2, mode=Mode.SUBTRACT)
    with BuildSketch(Plane(origin=(17.1, 20, -2.5), x_dir=(0, -1, 0), z_dir=(-1, 0, 0)), Plane(origin=(-21.6, 20, -36.2), x_dir=(0, -1, 0), z_dir=(-1, 0, 0)), Plane(origin=(55.8, 20, -36.2), x_dir=(0, -1, 0), z_dir=(-1, 0, 0))) as fillet4_piece_19:
        with BuildLine():
            CenterArc((FILLET4_R, FILLET4_R), FILLET4_R, 180, 90)
            Line((0, FILLET4_R), (0, 0))
            Line((0, 0), (FILLET4_R, 0))
        make_face()
    extrude(amount=34.7, mode=Mode.SUBTRACT)
    with BuildSketch(Plane(origin=(-21.6, 15, -34.2), x_dir=(1, 0, 0), z_dir=(0, 0, 1))) as fillet4_piece_20:
        with BuildLine():
            CenterArc((2 - FILLET4_R, FILLET4_R), FILLET4_R, 270, 90)
            Line((2 - FILLET4_R, 0), (2, 0))
            Line((2, 0), (2, FILLET4_R))
        make_face()
    revolve(axis=Axis((-21.6, 15, -34.2), (0, 1, 0)), revolution_arc=90, mode=Mode.SUBTRACT)
    with BuildSketch(Plane(origin=(-56.3, 15, -34.2), x_dir=(-1, 0, 0), z_dir=(0, 0, 1))) as fillet4_piece_21:
        with BuildLine():
            CenterArc((2 - FILLET4_R, -FILLET4_R), FILLET4_R, 0, 90)
            Line((2 - FILLET4_R, 0), (2, 0))
            Line((2, 0), (2, -FILLET4_R))
        make_face()
    revolve(axis=Axis((-56.3, 15, -34.2), (0, -1, 0)), revolution_arc=90, mode=Mode.SUBTRACT)
    with BuildSketch(Plane(origin=(55.8, 20, -34.2), x_dir=(1, 0, 0), z_dir=(0, 0, 1))) as fillet4_piece_22:
        with BuildLine():
            CenterArc((2 - FILLET4_R, -FILLET4_R), FILLET4_R, 0, 90)
            Line((2 - FILLET4_R, 0), (2, 0))
            Line((2, 0), (2, -FILLET4_R))
        make_face()
    revolve(axis=Axis((55.8, 20, -34.2), (0, 1, 0)), revolution_arc=90, mode=Mode.SUBTRACT)

    # Sketch4 → Cut-Extrude2 (cut, through all)
    with BuildSketch(Plane.XY.offset(2.5)):
        with Locations((-82.5, 9)):
            Circle(SKETCH4_R)
        with Locations((-82.5, -11)):
            Circle(SKETCH4_R)
    extrude(amount=-CUT_EXTRUDE2_DEPTH, mode=Mode.SUBTRACT)


solid = part.part
